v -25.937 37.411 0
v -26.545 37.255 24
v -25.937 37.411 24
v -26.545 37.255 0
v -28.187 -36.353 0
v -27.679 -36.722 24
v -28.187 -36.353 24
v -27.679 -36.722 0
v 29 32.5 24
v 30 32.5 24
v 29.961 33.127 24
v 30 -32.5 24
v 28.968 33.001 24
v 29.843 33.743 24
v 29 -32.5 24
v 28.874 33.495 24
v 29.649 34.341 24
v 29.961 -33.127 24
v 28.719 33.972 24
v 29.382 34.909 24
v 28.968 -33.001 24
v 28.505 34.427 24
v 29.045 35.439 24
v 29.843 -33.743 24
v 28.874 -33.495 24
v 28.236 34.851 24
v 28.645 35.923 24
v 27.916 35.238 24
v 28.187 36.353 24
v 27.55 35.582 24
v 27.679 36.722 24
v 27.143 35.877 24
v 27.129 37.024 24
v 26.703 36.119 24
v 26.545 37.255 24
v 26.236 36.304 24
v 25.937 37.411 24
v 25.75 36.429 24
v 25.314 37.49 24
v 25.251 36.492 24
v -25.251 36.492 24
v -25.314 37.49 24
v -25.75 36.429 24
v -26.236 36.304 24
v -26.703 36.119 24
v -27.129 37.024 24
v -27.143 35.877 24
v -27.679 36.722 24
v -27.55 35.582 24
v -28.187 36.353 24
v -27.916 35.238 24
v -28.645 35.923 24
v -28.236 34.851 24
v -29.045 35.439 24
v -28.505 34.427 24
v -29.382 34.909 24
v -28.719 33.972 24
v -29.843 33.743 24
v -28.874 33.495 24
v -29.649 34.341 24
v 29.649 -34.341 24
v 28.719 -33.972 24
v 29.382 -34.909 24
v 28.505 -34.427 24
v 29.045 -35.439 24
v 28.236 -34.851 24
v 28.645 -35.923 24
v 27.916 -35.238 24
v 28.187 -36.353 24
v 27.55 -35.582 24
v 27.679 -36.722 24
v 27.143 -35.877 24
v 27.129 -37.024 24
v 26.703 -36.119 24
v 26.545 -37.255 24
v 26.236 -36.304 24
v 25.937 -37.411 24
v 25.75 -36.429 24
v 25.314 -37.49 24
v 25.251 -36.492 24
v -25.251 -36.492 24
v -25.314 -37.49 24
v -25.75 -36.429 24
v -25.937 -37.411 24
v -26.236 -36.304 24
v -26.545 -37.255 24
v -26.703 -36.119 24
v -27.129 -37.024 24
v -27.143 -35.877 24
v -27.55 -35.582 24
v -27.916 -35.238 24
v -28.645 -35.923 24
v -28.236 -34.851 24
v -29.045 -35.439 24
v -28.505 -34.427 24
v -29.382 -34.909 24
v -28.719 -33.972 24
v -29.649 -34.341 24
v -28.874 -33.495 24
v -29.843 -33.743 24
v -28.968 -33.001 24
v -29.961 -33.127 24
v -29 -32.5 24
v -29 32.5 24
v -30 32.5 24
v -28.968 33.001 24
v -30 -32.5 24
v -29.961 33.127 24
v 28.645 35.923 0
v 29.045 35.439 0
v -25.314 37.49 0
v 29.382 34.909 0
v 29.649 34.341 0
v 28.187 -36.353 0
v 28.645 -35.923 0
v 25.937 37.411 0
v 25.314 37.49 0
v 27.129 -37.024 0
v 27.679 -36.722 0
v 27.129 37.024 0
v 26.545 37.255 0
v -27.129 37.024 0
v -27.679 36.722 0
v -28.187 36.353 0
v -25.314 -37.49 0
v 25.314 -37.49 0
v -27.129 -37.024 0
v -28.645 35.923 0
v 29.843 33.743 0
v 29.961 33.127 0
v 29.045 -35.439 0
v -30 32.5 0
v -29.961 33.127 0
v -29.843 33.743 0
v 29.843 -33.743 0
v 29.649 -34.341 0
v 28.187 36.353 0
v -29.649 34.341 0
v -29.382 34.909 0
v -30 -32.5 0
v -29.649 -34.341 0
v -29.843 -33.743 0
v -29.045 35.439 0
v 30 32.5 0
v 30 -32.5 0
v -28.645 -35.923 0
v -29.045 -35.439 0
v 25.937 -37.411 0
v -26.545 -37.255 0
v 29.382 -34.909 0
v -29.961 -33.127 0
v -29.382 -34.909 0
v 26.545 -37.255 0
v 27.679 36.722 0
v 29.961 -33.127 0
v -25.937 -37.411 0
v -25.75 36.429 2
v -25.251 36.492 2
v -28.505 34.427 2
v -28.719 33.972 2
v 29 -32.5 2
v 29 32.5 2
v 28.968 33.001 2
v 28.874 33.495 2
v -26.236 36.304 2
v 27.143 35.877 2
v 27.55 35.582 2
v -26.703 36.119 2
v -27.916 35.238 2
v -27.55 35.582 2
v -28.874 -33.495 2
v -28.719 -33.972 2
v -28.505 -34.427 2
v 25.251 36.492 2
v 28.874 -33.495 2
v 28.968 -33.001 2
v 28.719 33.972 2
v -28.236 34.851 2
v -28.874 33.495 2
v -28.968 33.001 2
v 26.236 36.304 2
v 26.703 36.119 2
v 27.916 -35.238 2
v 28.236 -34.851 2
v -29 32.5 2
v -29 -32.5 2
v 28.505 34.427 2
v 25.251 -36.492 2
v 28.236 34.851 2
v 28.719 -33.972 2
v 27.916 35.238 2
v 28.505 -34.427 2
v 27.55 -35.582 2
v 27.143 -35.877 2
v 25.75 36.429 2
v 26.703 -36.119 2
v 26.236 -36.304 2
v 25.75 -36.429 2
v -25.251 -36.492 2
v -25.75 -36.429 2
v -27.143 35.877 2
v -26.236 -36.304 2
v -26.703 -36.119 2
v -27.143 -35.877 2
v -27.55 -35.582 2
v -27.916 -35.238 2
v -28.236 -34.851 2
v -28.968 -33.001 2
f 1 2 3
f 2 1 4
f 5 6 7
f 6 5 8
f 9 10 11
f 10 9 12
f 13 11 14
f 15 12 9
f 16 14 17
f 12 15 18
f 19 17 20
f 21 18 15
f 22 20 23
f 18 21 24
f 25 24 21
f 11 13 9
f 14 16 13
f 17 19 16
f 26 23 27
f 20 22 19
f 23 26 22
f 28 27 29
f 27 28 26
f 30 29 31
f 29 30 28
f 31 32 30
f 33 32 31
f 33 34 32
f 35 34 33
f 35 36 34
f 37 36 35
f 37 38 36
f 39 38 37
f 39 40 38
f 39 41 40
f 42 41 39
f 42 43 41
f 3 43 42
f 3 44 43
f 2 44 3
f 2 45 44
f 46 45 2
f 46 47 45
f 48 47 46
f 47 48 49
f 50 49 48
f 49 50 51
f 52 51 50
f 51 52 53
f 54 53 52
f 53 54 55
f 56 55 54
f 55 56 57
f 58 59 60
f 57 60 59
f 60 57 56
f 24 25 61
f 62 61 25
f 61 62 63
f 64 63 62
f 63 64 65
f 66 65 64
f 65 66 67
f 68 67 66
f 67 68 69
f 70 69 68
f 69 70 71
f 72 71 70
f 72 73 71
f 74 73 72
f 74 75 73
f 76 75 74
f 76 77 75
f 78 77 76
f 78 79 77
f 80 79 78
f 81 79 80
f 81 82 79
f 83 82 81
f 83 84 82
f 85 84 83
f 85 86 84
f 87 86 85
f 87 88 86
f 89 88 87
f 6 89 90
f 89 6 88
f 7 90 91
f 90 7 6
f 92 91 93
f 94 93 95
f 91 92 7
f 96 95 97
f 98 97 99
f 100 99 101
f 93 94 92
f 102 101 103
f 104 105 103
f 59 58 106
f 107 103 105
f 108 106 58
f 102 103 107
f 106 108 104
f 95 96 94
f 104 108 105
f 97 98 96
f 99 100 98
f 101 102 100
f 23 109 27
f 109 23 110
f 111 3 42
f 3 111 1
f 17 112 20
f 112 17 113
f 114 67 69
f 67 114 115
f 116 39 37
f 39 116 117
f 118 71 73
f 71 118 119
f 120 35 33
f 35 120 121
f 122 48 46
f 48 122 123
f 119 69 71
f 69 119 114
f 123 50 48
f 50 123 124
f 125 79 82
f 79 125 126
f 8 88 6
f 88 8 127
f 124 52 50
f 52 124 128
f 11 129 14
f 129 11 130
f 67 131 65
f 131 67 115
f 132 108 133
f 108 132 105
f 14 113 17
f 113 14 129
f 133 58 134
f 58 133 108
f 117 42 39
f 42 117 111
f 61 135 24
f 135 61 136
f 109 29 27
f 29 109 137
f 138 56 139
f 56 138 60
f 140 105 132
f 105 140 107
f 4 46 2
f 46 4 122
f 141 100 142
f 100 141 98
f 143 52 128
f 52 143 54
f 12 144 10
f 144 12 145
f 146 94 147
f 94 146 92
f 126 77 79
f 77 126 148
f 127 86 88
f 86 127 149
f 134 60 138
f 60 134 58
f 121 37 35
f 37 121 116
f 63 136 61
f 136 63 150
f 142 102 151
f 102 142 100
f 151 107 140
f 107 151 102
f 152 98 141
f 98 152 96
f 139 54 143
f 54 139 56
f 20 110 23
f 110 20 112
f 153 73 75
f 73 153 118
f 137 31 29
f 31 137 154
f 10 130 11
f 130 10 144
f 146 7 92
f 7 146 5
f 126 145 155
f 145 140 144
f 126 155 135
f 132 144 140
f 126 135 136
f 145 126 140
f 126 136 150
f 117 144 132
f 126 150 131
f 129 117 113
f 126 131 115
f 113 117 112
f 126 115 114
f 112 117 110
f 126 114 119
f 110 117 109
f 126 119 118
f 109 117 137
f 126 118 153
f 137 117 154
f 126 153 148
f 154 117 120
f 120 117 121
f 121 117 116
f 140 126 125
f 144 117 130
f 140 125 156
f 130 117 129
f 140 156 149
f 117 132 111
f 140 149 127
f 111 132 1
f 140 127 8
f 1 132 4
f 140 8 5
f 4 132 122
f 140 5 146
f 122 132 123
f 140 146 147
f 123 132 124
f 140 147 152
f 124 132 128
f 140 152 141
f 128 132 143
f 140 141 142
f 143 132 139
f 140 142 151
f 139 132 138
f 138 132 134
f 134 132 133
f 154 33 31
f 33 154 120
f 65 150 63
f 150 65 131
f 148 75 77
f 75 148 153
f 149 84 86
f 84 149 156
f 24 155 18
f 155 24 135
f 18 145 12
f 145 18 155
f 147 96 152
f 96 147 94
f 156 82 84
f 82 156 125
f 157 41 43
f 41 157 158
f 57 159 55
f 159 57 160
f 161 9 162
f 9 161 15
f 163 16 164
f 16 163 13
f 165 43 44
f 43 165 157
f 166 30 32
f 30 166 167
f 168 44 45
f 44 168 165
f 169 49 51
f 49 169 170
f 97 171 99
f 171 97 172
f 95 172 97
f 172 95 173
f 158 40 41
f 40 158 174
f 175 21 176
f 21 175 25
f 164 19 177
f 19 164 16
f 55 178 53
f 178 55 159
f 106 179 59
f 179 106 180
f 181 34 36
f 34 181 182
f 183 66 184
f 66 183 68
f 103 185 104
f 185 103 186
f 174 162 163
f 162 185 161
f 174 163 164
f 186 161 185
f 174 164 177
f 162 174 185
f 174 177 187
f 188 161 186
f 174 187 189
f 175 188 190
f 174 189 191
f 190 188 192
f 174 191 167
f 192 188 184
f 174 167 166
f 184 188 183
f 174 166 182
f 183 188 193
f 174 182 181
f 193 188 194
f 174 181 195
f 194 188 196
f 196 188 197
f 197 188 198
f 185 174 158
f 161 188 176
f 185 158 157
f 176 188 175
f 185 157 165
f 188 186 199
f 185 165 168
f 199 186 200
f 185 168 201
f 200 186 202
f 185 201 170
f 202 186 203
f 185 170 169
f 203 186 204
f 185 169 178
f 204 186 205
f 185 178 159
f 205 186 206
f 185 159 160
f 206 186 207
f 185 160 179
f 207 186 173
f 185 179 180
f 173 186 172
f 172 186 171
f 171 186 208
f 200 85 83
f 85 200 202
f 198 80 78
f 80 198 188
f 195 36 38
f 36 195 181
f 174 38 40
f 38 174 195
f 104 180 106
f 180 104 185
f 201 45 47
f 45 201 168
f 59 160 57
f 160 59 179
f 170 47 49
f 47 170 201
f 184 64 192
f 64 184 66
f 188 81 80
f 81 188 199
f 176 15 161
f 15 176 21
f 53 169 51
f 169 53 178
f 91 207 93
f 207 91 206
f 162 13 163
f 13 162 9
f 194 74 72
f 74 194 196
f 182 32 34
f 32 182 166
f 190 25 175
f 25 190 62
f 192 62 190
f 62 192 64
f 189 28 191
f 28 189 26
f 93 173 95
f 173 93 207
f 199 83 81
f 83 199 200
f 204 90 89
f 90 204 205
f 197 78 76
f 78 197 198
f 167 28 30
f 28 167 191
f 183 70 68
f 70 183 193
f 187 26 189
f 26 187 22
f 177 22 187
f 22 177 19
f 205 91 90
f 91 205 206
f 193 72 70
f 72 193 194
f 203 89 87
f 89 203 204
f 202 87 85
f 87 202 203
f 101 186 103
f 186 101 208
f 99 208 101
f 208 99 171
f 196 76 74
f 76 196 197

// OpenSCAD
$fn = 50;


difference() {
	union() {
		hull() {
			translate(v = [-25.0000000000, 32.5000000000, 0]) {
				cylinder(h = 24, r = 5);
			}
			translate(v = [25.0000000000, 32.5000000000, 0]) {
				cylinder(h = 24, r = 5);
			}
			translate(v = [-25.0000000000, -32.5000000000, 0]) {
				cylinder(h = 24, r = 5);
			}
			translate(v = [25.0000000000, -32.5000000000, 0]) {
				cylinder(h = 24, r = 5);
			}
		}
	}
	union() {
		translate(v = [0, 0, 2]) {
			hull() {
				translate(v = [-25.0000000000, 32.5000000000, 0]) {
					cylinder(h = 22, r = 4);
				}
				translate(v = [25.0000000000, 32.5000000000, 0]) {
					cylinder(h = 22, r = 4);
				}
				translate(v = [-25.0000000000, -32.5000000000, 0]) {
					cylinder(h = 22, r = 4);
				}
				translate(v = [25.0000000000, -32.5000000000, 0]) {
					cylinder(h = 22, r = 4);
				}
			}
		}
	}
}
